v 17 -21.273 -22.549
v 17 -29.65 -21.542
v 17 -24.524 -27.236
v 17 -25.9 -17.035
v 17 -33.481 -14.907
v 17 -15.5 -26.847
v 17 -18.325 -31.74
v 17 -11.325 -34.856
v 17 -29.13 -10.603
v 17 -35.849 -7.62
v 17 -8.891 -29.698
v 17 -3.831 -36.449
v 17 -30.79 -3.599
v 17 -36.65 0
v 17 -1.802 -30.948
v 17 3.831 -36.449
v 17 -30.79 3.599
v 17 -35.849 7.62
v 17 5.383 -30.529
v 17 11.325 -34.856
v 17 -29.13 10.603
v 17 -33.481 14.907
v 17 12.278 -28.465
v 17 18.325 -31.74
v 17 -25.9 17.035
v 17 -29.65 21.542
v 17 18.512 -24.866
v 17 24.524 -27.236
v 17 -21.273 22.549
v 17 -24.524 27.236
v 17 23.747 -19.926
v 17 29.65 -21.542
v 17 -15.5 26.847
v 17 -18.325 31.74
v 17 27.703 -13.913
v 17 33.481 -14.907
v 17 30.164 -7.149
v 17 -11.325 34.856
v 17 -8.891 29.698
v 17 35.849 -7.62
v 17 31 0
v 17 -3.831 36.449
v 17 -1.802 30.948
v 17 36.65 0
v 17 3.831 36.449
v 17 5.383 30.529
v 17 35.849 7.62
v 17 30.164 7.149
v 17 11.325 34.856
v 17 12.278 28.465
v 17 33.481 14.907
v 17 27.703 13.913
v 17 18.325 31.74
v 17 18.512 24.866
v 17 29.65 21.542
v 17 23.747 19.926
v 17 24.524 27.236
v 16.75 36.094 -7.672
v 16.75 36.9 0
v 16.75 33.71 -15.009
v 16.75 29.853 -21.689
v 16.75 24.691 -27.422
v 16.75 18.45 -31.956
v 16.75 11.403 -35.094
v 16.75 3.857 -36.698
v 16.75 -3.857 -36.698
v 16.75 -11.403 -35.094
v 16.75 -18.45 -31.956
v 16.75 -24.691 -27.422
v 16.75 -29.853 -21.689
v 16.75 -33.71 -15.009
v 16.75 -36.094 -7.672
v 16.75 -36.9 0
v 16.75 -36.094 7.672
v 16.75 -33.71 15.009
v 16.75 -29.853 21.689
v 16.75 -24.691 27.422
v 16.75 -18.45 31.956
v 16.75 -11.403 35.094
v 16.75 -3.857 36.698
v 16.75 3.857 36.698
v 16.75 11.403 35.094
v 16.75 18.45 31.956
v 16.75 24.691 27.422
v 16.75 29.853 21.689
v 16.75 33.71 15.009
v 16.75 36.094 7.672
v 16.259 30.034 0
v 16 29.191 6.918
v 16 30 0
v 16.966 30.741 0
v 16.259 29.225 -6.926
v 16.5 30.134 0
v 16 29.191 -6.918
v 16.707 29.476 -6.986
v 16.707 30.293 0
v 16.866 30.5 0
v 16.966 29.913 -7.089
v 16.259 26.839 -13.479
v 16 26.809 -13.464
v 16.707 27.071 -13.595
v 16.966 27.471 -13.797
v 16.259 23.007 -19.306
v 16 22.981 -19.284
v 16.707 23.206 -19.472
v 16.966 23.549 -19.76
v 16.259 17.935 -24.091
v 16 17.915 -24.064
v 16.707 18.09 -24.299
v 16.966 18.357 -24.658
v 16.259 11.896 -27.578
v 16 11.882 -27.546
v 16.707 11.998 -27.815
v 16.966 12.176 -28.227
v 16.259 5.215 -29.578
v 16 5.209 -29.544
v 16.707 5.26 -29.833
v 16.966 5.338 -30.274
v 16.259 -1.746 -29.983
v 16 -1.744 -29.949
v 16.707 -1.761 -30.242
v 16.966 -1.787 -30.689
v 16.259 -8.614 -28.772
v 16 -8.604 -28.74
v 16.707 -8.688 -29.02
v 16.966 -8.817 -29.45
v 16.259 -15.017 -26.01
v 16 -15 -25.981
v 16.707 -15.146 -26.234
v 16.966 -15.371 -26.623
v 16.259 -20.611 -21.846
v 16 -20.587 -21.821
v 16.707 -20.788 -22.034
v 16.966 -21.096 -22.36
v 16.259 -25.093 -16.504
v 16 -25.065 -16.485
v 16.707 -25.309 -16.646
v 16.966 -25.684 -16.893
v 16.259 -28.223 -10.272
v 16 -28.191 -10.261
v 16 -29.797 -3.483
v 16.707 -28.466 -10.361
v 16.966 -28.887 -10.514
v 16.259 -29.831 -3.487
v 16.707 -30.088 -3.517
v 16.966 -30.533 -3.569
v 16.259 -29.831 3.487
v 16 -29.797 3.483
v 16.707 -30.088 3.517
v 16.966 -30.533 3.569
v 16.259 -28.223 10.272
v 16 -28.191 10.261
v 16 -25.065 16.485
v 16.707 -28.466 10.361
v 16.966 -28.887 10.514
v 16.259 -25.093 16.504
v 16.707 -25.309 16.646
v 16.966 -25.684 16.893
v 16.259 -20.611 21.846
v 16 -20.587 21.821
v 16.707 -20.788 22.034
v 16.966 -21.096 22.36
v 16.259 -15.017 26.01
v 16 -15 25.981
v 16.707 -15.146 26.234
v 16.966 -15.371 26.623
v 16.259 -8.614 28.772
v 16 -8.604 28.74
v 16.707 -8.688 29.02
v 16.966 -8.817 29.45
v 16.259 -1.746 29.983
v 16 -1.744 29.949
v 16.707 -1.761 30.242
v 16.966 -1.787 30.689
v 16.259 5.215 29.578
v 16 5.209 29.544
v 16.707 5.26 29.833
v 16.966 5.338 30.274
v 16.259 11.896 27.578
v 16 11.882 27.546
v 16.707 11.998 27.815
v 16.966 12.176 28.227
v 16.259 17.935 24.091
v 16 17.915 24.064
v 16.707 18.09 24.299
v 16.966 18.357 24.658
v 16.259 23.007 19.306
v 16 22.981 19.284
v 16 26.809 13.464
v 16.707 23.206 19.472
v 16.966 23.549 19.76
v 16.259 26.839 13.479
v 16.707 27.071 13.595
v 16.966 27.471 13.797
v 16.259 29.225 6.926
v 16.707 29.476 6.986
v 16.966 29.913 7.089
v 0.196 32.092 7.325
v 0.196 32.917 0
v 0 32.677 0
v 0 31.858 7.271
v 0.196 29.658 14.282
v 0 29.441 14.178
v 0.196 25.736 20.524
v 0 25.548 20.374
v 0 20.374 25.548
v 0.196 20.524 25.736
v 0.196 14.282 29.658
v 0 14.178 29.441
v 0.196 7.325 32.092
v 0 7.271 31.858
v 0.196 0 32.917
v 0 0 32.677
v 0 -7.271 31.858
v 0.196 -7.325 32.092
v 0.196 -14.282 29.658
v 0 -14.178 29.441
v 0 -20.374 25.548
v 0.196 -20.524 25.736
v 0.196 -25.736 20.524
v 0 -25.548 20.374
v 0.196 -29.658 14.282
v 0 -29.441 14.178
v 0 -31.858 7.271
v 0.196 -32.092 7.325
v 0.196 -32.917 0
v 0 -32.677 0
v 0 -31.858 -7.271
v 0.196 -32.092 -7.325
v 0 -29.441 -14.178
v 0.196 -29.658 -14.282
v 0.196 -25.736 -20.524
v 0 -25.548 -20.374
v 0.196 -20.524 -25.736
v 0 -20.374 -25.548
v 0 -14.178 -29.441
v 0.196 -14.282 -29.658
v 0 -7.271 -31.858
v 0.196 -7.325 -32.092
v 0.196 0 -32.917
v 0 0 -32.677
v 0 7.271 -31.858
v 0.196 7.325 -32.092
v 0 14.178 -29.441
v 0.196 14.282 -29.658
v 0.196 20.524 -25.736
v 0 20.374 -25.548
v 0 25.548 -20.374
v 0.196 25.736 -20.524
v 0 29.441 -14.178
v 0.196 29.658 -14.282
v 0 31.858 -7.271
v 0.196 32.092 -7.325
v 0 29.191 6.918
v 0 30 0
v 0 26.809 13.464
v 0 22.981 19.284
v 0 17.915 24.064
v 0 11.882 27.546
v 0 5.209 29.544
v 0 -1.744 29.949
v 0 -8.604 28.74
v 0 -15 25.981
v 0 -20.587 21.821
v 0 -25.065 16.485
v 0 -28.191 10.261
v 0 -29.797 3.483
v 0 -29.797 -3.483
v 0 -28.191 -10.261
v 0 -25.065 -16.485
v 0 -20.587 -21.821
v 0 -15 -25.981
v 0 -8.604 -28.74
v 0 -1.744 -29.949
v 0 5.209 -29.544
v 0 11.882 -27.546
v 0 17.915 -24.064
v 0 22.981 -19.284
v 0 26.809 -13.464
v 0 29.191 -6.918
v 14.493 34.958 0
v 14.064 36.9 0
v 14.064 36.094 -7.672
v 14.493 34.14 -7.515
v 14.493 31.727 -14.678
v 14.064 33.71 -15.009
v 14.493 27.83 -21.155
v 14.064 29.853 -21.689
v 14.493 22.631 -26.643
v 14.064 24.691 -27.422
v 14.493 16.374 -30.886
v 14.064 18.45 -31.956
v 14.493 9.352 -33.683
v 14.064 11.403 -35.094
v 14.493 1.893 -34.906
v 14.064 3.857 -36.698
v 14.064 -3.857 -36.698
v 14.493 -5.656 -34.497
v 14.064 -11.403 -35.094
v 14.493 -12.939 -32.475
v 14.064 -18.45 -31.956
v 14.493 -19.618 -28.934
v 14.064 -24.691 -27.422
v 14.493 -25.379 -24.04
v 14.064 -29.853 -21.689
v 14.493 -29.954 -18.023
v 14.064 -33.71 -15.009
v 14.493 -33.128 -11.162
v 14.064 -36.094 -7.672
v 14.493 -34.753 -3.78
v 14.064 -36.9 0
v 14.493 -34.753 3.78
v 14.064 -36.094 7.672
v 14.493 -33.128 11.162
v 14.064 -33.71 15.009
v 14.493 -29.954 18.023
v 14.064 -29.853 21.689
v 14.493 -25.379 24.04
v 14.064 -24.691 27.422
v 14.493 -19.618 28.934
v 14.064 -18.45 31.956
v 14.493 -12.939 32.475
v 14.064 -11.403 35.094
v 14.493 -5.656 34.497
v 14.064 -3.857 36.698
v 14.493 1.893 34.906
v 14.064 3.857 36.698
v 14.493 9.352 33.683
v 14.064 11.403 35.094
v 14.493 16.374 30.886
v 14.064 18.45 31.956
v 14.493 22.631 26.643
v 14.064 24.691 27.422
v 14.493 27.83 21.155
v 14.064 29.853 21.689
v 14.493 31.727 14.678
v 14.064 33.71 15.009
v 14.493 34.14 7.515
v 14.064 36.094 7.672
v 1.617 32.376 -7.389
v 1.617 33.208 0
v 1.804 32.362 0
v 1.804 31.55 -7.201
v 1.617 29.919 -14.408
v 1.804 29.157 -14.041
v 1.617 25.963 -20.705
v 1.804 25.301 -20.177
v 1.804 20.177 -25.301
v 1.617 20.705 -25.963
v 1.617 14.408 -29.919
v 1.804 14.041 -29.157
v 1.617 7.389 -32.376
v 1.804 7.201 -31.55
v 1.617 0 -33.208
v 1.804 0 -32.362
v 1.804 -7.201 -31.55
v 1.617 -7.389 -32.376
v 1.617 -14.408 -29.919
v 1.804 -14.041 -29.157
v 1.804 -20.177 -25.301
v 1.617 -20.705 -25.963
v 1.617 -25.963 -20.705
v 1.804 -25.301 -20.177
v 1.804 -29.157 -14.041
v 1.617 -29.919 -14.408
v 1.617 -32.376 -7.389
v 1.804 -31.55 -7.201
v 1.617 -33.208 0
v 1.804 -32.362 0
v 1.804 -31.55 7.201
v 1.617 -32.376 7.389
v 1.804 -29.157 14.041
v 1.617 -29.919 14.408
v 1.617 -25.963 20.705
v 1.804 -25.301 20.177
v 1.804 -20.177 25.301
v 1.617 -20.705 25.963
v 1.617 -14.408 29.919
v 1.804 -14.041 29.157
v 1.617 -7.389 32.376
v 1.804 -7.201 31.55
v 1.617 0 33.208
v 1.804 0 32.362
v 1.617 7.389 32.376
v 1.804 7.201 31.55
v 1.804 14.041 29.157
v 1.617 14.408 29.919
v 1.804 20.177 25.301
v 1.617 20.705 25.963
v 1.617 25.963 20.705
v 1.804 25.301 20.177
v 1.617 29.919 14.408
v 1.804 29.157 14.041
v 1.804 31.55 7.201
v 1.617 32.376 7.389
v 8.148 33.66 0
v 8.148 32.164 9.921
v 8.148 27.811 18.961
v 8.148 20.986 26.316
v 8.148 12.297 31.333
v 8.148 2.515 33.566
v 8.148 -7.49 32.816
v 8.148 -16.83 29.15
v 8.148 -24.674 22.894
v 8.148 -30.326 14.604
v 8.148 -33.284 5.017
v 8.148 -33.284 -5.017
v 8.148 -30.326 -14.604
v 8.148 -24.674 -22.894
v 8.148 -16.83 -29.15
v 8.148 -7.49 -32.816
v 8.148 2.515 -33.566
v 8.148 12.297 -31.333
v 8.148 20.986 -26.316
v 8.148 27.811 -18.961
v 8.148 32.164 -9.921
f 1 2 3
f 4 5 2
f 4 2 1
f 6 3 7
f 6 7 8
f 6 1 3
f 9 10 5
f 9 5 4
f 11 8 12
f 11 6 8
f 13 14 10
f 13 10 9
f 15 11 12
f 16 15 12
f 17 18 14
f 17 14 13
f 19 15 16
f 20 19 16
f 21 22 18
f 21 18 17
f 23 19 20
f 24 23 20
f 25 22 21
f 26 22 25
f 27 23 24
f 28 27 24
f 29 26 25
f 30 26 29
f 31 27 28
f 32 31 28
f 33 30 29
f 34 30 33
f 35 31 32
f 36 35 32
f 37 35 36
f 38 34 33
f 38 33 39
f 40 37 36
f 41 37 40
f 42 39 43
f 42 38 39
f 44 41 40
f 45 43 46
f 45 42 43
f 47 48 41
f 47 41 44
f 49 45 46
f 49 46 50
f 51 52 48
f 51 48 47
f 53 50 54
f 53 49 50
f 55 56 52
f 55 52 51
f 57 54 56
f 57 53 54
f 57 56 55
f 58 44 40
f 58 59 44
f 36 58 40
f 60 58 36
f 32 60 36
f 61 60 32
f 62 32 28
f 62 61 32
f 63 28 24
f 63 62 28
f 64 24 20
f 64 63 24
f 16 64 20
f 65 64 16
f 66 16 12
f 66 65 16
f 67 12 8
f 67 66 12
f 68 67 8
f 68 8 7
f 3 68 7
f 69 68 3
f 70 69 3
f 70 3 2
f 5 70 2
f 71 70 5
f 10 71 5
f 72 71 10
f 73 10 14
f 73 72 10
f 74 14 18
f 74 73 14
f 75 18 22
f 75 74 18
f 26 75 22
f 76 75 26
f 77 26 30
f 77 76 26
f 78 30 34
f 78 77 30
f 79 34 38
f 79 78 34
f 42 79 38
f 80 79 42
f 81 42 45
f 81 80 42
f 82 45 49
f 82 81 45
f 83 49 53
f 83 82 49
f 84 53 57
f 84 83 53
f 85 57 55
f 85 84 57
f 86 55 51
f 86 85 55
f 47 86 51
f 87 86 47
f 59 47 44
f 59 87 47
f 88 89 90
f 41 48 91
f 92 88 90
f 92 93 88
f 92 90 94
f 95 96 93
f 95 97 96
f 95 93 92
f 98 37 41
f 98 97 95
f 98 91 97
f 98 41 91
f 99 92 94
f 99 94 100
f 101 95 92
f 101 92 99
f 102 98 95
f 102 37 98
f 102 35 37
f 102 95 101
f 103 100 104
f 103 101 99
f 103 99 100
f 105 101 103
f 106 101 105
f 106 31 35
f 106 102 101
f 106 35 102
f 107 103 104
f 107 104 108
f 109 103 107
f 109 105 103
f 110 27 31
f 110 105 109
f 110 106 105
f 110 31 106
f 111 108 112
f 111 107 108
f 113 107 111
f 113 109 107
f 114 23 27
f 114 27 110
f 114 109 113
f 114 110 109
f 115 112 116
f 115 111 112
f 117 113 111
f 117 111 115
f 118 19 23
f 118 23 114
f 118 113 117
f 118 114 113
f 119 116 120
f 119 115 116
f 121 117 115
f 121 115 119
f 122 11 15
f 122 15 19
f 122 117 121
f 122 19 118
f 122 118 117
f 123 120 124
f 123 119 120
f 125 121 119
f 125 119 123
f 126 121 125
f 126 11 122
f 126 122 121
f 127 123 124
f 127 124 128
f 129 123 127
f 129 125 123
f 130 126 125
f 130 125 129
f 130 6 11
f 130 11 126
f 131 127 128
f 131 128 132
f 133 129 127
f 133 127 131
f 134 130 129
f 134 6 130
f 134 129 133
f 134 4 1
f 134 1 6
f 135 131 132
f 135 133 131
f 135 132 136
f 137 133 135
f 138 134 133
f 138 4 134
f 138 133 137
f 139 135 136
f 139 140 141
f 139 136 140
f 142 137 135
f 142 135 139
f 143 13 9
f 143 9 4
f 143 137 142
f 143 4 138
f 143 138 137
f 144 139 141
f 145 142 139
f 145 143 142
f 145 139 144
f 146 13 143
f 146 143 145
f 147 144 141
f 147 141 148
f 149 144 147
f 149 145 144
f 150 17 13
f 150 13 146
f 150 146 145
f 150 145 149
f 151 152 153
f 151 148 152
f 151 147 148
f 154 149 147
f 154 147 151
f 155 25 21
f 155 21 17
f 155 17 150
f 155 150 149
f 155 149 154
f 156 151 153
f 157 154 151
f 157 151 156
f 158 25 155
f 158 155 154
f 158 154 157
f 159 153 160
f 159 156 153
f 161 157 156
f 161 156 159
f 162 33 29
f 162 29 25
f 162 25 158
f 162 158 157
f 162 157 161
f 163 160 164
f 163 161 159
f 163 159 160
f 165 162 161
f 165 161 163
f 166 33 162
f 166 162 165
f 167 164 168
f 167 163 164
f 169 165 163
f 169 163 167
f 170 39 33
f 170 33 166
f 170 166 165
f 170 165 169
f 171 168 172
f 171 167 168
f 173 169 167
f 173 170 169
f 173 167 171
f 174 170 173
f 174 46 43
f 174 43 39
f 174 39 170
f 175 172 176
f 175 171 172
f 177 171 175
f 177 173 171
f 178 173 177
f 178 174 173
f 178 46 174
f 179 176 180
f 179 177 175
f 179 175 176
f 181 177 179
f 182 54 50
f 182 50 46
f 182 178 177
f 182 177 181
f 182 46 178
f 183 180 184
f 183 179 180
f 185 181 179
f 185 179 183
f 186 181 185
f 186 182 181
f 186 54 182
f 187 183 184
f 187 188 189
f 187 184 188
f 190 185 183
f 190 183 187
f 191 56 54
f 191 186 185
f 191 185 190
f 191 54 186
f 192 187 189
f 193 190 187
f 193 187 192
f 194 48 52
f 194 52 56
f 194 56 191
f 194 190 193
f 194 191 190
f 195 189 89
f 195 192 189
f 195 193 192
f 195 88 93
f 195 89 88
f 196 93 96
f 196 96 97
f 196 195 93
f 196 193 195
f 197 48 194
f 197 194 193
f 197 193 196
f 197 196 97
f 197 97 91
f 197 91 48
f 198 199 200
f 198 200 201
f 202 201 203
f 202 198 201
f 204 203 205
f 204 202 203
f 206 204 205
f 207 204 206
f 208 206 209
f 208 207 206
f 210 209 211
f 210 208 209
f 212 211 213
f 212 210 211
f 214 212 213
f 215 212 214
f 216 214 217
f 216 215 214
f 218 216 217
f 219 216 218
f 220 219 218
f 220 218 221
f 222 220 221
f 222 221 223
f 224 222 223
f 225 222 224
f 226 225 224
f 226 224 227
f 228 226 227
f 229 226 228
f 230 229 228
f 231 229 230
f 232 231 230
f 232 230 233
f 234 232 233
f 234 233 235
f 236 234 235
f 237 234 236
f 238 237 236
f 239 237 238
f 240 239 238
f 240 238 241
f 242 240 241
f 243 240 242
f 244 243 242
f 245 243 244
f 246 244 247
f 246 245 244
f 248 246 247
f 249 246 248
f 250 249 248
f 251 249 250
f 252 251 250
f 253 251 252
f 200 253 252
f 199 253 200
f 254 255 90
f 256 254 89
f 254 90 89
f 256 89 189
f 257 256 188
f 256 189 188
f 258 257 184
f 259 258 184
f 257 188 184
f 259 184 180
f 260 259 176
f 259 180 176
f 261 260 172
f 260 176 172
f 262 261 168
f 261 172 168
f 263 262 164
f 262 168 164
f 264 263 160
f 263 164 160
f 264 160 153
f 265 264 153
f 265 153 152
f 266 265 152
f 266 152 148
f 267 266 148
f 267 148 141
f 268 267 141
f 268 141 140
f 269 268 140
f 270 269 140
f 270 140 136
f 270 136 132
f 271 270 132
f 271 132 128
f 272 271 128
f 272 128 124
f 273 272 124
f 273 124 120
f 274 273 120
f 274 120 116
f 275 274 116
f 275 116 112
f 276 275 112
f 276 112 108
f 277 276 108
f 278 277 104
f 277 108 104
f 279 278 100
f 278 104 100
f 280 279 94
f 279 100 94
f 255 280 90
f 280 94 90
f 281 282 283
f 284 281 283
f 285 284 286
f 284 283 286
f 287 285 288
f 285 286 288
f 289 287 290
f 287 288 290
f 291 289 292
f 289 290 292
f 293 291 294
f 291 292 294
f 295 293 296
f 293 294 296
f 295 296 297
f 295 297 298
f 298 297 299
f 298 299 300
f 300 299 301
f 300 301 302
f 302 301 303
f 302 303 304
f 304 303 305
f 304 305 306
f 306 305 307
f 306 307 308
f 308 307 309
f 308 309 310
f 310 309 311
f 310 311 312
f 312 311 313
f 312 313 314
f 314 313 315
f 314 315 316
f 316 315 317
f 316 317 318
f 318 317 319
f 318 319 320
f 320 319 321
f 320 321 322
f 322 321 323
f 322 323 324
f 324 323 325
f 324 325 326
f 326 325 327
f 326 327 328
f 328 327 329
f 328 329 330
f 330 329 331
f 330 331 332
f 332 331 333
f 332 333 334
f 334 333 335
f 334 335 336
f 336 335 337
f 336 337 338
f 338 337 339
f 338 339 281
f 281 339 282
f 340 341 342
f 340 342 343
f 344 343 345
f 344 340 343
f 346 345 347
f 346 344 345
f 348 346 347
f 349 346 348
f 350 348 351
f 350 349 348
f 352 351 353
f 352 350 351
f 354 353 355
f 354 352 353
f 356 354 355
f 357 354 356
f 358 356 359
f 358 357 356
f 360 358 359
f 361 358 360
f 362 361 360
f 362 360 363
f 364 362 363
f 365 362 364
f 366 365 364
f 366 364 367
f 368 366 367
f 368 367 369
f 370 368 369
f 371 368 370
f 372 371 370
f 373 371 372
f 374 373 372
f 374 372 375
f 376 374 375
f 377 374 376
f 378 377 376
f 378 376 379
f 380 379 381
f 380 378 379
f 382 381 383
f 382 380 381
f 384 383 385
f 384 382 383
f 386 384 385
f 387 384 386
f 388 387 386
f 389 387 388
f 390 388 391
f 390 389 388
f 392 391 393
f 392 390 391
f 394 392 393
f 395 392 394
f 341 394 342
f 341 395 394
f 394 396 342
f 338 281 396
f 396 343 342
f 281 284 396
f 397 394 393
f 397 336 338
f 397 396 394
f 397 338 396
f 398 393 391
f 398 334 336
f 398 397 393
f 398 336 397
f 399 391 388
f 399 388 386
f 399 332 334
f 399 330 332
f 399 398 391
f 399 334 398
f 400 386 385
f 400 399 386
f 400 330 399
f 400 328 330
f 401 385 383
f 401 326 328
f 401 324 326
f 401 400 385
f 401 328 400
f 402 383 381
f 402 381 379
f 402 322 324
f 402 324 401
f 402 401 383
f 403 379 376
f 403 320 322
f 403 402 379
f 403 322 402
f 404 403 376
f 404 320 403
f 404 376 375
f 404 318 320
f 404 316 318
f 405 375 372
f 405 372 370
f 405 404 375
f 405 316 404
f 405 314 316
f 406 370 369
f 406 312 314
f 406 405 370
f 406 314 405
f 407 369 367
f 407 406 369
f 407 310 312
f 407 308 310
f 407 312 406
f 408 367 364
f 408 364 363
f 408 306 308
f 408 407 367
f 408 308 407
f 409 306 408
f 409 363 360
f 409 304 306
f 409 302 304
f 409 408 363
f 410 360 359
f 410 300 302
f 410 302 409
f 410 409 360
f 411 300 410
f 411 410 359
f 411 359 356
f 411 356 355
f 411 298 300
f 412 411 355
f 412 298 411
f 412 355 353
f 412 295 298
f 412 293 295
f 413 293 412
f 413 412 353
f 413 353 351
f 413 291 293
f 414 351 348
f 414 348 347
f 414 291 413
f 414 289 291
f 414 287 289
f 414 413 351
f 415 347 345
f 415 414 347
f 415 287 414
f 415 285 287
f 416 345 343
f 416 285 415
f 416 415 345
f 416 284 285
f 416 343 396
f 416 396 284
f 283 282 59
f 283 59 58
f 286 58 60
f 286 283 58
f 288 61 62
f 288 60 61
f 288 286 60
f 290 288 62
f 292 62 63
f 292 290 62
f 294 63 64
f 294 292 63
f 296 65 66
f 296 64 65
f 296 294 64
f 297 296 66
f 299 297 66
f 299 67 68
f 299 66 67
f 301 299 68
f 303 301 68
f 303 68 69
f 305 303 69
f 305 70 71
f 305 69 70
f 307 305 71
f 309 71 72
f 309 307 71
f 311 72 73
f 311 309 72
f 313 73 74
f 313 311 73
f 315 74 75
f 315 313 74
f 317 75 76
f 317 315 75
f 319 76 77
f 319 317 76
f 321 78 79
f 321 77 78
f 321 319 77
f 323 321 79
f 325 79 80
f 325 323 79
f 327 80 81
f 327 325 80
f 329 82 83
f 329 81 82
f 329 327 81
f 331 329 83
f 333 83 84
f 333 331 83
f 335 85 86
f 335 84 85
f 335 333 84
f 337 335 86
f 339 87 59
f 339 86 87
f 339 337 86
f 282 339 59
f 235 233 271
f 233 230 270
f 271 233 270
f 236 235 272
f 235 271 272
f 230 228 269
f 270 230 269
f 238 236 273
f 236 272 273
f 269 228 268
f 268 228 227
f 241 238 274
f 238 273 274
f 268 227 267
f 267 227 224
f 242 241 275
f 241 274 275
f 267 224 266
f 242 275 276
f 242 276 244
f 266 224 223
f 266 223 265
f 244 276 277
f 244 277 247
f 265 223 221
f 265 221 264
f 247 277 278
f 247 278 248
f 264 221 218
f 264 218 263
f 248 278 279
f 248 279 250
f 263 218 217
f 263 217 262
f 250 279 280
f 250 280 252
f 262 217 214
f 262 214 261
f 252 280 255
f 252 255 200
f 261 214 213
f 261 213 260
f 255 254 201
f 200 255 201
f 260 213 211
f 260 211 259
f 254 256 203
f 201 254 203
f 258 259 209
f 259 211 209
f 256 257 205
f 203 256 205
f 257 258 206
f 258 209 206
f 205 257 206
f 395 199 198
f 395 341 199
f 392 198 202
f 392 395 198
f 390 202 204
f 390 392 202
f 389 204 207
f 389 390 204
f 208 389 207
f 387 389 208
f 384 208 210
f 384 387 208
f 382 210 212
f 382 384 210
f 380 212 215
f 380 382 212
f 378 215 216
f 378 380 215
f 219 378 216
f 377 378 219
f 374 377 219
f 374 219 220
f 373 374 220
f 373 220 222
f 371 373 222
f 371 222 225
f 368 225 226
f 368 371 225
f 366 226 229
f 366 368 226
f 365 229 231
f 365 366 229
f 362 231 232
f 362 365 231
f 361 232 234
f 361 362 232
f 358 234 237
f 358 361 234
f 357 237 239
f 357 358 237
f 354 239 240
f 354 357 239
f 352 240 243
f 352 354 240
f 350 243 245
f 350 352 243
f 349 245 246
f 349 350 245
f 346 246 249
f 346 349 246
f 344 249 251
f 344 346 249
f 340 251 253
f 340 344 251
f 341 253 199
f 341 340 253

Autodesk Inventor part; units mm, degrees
sketch "Sketch_1" plane through (0, 0, 0) normal (0, 0, 1) x (1, 0, 0)
  line L0 (16, 0) -> (0, 0)
  line L1 (0, 32.6773) -> (0, 30)
  line L2 (0, 30) -> (16, 30)
  arc A0 (16, 30) -> (17, 31) centre (16, 31) ccw
  line L3 (17, 31) -> (17, 36.65)
  line L4 (17, 36.65) -> (16.75, 36.9)
  line L5 (16.75, 36.9) -> (14.0638, 36.9)
  line L6 (14.0638, 36.9) -> (14.4927, 34.9577)
  line L7 (14.4927, 34.9577) -> (1.8039, 32.3617)
  line L8 (1.8039, 32.3617) -> (1.6171, 33.2081)
  line L9 (1.6171, 33.2081) -> (0.1959, 32.9174)
  line L10 (0.1959, 32.9174) -> (0, 32.6773)
revolve "Revolution1" add sketch "Sketch_1" angle 360 about axis through (16, 0, 0) along (1, 0, 0)
ref_plane "inner_ring_XY" through (0, 0, 0) normal (0, 0, 1) x (1, 0, 0)
ref_plane "inner_ring_YZ" through (0, 0, 0) normal (1, 0, 0) x (0, 1, 0)
ref_plane "inner_ring_ZX" through (0, 0, 0) normal (0, 1, 0) x (0, 0, 1)
properties part number "32912_ir"
